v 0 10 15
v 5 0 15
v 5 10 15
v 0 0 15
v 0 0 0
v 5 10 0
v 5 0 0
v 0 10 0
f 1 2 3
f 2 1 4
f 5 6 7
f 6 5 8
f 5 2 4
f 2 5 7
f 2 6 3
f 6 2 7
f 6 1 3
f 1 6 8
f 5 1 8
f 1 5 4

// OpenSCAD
/*
 * Multi-line block comment at the top.
 * This should be preserved in output.
 */

// Multi-line list assignment
Colors = [
  "red",
  "green",
  "blue"
];

Size = 5;

module multilineBox(
  width,
  height,
  depth) {
  cube([width, height, depth]);
}

multilineBox(
  Size,
  Size * 2,
  Size * 3
);
